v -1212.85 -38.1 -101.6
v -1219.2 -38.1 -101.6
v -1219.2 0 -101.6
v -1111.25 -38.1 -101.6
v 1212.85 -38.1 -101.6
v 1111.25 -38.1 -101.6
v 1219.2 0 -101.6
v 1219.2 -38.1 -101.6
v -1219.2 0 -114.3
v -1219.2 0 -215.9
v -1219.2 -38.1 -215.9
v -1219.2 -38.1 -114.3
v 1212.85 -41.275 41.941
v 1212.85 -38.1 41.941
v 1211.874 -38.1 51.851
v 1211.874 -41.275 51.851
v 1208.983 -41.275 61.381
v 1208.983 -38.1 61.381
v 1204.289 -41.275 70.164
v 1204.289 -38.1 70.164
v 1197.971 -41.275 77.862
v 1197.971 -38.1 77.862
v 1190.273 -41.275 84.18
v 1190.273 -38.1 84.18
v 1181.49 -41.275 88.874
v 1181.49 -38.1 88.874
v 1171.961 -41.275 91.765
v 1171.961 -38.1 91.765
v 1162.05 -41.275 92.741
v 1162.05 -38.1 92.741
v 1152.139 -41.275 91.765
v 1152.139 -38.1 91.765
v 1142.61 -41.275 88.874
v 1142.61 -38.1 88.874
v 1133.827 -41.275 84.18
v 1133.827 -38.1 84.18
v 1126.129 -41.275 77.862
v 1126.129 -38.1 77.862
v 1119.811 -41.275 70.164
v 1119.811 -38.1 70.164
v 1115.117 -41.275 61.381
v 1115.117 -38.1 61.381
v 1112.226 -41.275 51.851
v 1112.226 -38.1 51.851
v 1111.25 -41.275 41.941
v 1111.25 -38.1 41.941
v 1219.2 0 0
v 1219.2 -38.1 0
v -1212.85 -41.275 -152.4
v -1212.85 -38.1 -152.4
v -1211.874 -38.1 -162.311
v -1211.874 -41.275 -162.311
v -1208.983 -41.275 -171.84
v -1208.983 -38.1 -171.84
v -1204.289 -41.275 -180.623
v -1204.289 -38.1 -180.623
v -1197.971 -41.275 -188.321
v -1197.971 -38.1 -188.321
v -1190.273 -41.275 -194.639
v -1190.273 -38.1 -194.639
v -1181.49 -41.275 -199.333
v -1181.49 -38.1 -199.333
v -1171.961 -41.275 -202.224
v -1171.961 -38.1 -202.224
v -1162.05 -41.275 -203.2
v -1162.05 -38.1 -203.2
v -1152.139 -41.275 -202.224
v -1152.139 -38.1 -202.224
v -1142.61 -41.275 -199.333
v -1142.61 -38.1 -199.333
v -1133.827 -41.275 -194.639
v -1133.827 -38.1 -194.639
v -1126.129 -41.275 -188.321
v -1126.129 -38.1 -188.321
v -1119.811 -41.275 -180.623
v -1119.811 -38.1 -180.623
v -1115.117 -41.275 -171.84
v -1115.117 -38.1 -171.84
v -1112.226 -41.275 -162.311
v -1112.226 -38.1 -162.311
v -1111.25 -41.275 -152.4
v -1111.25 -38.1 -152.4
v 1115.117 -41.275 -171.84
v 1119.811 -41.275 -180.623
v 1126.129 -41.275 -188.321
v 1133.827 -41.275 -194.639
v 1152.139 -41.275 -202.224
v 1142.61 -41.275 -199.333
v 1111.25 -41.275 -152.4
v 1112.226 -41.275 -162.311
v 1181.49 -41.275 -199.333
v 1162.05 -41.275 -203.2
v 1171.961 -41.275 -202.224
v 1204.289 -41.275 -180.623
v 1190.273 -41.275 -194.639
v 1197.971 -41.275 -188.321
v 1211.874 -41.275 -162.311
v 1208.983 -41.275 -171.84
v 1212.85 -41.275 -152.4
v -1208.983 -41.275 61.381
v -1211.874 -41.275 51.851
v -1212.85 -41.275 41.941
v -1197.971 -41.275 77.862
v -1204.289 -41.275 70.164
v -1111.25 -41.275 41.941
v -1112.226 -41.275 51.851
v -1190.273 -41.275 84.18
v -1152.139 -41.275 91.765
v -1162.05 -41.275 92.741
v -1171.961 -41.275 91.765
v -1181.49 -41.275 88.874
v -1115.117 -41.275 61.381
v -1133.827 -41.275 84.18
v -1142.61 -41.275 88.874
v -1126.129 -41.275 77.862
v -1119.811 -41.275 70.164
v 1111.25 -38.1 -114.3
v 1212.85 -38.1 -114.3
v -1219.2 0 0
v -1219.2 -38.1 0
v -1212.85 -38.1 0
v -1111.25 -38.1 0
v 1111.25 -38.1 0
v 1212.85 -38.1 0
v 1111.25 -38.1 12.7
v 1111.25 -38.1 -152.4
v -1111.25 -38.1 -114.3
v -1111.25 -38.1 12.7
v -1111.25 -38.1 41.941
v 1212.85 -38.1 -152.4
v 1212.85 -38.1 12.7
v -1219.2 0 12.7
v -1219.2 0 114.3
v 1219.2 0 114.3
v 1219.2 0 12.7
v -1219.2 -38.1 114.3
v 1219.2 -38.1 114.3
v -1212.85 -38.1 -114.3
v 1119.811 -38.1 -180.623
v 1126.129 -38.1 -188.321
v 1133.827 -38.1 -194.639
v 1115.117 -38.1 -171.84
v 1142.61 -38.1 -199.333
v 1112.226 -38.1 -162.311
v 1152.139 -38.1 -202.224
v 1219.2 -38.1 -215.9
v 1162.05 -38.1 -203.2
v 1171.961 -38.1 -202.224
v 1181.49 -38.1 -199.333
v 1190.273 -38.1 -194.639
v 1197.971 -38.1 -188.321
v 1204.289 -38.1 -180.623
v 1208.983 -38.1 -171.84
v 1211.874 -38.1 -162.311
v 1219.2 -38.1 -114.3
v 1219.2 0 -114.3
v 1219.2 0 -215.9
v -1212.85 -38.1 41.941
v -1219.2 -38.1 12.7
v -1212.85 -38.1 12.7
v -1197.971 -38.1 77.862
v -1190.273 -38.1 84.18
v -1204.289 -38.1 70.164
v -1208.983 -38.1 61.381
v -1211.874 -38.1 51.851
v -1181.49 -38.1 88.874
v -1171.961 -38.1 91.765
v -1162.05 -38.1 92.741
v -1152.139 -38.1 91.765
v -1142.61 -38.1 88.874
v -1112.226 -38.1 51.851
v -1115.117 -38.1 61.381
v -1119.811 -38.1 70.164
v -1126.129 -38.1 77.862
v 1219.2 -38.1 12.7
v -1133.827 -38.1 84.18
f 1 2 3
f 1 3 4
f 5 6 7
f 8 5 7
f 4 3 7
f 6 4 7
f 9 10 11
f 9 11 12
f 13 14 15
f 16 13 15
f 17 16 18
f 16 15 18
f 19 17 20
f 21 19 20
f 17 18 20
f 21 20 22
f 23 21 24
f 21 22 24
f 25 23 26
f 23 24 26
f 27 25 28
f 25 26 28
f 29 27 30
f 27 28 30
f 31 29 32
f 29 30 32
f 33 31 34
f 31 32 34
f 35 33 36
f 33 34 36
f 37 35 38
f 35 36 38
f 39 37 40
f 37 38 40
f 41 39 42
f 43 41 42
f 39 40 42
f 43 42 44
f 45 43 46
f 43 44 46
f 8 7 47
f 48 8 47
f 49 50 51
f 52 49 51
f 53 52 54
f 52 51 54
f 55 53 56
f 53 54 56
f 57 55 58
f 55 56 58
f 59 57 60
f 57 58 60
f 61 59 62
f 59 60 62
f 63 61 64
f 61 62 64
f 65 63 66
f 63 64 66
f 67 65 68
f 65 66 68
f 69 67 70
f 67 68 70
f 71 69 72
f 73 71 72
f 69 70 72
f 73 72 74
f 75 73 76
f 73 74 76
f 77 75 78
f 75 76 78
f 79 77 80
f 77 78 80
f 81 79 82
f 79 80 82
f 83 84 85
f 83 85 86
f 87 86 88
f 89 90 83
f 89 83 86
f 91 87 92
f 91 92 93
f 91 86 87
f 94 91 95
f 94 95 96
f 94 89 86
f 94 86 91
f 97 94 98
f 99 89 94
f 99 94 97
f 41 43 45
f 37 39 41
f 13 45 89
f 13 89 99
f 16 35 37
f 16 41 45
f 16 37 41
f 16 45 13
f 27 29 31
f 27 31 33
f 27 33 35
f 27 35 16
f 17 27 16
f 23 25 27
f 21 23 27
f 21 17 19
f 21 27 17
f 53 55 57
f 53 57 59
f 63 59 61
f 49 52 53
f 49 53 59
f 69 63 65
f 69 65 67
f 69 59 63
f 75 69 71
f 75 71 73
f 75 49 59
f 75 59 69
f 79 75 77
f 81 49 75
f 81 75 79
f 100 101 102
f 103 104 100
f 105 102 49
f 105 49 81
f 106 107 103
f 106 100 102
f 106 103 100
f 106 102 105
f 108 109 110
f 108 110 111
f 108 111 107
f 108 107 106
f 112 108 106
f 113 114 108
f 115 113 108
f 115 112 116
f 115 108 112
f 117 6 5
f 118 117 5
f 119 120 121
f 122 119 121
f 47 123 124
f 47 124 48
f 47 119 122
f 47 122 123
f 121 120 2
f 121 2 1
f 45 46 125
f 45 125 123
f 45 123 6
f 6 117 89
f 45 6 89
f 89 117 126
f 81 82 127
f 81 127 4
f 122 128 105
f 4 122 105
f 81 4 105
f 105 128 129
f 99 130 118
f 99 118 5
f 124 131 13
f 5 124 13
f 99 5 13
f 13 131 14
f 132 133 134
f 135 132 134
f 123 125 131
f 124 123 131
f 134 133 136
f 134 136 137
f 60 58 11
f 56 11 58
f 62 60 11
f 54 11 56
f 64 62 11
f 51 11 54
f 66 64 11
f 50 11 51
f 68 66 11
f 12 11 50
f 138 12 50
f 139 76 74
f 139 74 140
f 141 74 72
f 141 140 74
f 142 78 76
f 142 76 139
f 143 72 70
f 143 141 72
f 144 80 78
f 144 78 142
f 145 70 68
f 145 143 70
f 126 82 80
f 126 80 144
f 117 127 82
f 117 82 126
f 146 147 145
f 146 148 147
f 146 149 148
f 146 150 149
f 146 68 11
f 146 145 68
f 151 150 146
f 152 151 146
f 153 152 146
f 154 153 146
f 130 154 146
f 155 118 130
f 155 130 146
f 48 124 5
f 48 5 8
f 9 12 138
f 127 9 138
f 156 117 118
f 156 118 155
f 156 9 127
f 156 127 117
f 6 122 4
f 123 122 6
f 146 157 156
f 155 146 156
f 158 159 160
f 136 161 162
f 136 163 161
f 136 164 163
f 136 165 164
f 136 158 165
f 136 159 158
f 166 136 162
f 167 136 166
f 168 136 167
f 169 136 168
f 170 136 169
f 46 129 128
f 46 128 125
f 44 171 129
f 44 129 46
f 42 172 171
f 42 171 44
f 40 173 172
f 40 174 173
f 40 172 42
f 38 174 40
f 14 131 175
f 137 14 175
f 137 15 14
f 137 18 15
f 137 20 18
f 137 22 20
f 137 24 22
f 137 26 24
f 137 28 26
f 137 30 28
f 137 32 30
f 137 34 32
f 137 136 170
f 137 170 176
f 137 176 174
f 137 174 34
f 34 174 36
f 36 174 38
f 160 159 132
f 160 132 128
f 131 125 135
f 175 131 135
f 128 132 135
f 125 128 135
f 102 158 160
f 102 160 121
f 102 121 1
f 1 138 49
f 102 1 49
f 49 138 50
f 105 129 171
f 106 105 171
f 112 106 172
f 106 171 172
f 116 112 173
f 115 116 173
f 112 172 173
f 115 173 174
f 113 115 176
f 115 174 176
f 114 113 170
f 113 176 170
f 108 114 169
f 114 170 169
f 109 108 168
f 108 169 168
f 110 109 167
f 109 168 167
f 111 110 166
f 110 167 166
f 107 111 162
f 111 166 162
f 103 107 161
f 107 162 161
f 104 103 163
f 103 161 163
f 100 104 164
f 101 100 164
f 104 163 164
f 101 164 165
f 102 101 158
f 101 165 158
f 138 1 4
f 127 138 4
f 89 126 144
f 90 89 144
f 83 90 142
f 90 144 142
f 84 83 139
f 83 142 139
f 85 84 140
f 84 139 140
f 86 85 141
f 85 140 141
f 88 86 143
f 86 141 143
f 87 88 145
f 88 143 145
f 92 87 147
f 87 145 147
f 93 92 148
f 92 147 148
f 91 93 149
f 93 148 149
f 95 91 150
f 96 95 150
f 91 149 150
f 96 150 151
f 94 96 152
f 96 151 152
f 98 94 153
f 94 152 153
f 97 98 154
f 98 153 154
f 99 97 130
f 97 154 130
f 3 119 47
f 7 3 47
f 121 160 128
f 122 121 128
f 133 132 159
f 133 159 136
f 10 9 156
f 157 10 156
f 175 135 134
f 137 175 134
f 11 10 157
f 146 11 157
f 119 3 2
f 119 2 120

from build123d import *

# Parameters (mm, degrees)
F0_W     = 2438.4
F0_H     = 101.6
F1_DEPTH = 38.1
F3_DEPTH = 3.175


with BuildPart() as f1:
    # F0 (on Front) → F1 (new body)
    with BuildSketch(Plane.XZ):
        with Locations((0, 63.5)):
            Rectangle(F0_W, F0_H)
    extrude(amount=F1_DEPTH)



with BuildPart() as f1b:
    # F0 (on Front) → F1, piece 2 (new body)
    with BuildSketch(Plane.XZ):
        with Locations((0, -50.8)):
            Rectangle(F0_W, F0_H)
    extrude(amount=F1_DEPTH)


with BuildPart() as f1c:
    # F0 (on Front) → F1, piece 3 (new body)
    with BuildSketch(Plane.XZ):
        with Locations((0, -165.1)):
            Rectangle(F0_W, F0_H)
    extrude(amount=F1_DEPTH)


with BuildPart() as f1_1:
    add(f1.part)

    add(f1b.part)  # F3 merges F1b

    add(f1c.part)  # F3 merges F1c
    # F2 (on face) → F3 (join)
    with BuildSketch(Plane.XZ.offset(38.1)):
        with BuildLine():
            Line((-1212.85, 41.9409019501), (-1212.85, -152.4))
            ThreePointArc((-1212.85, -152.4), (-1162.05, -203.2), (-1111.25, -152.4))
            Line((-1111.25, -152.4), (-1111.25, 41.9409019501))
            ThreePointArc((-1111.25, 41.9409019501), (-1162.05, 92.7409019501), (-1212.85, 41.9409019501))
        make_face()
        with BuildLine():
            Line((1111.25, 41.9409019501), (1111.25, -152.4))
            ThreePointArc((1111.25, -152.4), (1162.05, -203.2), (1212.85, -152.4))
            Line((1212.85, -152.4), (1212.85, 41.9409019501))
            ThreePointArc((1212.85, 41.9409019501), (1162.05, 92.7409019501), (1111.25, 41.9409019501))
        make_face()
    extrude(amount=F3_DEPTH)


solid = f1_1.part
